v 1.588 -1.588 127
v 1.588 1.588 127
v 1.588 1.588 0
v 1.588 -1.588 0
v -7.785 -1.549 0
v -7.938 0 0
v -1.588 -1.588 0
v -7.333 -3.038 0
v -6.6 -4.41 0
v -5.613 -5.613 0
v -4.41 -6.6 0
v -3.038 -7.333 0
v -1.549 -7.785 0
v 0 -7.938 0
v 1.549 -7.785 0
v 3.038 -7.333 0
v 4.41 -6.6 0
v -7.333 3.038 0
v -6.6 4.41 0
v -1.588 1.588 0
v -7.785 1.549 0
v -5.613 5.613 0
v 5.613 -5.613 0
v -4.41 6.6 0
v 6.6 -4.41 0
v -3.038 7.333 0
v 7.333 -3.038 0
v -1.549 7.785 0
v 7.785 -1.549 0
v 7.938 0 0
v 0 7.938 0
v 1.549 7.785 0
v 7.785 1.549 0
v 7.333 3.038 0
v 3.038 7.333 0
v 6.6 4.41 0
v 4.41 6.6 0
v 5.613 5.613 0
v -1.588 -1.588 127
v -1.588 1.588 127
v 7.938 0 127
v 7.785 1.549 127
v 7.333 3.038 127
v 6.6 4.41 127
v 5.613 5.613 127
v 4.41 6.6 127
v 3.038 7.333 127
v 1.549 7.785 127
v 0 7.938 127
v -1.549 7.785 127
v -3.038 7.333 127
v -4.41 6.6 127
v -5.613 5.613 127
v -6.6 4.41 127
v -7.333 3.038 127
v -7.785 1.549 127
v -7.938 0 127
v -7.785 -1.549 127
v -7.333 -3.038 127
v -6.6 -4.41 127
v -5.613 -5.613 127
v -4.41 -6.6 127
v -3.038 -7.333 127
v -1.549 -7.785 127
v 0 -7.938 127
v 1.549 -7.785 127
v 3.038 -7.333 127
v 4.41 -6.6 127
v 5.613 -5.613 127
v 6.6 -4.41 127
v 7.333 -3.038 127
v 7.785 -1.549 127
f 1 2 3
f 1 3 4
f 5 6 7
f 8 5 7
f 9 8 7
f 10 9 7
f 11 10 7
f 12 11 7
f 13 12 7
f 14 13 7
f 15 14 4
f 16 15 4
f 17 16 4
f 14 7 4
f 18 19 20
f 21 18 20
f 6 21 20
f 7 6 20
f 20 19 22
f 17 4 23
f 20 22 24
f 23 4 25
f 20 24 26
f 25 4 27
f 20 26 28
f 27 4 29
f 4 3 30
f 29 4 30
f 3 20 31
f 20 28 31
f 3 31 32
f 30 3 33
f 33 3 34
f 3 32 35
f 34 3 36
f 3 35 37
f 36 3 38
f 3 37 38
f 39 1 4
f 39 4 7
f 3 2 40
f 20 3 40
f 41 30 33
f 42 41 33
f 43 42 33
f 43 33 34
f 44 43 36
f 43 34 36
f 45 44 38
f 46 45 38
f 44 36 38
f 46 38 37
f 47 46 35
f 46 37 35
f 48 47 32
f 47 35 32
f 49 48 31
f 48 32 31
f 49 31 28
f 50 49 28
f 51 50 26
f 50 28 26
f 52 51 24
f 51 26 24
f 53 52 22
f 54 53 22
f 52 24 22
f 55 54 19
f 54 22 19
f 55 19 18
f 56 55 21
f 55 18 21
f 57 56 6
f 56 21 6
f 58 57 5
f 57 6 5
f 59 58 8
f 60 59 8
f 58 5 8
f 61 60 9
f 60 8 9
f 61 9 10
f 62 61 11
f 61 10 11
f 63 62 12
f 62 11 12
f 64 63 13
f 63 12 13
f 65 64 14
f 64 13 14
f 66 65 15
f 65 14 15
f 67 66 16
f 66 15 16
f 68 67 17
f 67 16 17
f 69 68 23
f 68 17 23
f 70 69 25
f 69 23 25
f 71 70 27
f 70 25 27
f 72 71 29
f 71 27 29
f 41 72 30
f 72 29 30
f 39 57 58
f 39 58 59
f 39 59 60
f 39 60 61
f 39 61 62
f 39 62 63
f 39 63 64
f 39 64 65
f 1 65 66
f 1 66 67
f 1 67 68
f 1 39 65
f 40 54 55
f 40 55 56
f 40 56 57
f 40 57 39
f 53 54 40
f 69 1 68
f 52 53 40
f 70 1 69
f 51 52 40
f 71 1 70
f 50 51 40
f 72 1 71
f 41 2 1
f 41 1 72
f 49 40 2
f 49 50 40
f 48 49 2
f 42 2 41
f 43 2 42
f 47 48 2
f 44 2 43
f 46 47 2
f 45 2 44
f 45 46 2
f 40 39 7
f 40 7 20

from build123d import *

# Parameters (mm, degrees)
SKETCH1_R           = 7.9375
BOSS_EXTRUDE1_DEPTH = 127
CUT_EXTRUDE1_DEPTH  = 128


with BuildPart() as part:
    # Sketch1 → Boss-Extrude1 (new body)
    with BuildSketch(Plane.XY):
        Circle(SKETCH1_R)
    extrude(amount=BOSS_EXTRUDE1_DEPTH)

    # Sketch2 → Cut-Extrude1 (cut, through all)
    with BuildSketch(Plane.XY.offset(127)):
        Polygon((0, 1.5875), (1.5875, 1.5875), (1.5875, -1.5875), (-1.5875, -1.5875), (-1.5875, 1.5875), align=None)
    extrude(amount=-CUT_EXTRUDE1_DEPTH, mode=Mode.SUBTRACT)


solid = part.part
